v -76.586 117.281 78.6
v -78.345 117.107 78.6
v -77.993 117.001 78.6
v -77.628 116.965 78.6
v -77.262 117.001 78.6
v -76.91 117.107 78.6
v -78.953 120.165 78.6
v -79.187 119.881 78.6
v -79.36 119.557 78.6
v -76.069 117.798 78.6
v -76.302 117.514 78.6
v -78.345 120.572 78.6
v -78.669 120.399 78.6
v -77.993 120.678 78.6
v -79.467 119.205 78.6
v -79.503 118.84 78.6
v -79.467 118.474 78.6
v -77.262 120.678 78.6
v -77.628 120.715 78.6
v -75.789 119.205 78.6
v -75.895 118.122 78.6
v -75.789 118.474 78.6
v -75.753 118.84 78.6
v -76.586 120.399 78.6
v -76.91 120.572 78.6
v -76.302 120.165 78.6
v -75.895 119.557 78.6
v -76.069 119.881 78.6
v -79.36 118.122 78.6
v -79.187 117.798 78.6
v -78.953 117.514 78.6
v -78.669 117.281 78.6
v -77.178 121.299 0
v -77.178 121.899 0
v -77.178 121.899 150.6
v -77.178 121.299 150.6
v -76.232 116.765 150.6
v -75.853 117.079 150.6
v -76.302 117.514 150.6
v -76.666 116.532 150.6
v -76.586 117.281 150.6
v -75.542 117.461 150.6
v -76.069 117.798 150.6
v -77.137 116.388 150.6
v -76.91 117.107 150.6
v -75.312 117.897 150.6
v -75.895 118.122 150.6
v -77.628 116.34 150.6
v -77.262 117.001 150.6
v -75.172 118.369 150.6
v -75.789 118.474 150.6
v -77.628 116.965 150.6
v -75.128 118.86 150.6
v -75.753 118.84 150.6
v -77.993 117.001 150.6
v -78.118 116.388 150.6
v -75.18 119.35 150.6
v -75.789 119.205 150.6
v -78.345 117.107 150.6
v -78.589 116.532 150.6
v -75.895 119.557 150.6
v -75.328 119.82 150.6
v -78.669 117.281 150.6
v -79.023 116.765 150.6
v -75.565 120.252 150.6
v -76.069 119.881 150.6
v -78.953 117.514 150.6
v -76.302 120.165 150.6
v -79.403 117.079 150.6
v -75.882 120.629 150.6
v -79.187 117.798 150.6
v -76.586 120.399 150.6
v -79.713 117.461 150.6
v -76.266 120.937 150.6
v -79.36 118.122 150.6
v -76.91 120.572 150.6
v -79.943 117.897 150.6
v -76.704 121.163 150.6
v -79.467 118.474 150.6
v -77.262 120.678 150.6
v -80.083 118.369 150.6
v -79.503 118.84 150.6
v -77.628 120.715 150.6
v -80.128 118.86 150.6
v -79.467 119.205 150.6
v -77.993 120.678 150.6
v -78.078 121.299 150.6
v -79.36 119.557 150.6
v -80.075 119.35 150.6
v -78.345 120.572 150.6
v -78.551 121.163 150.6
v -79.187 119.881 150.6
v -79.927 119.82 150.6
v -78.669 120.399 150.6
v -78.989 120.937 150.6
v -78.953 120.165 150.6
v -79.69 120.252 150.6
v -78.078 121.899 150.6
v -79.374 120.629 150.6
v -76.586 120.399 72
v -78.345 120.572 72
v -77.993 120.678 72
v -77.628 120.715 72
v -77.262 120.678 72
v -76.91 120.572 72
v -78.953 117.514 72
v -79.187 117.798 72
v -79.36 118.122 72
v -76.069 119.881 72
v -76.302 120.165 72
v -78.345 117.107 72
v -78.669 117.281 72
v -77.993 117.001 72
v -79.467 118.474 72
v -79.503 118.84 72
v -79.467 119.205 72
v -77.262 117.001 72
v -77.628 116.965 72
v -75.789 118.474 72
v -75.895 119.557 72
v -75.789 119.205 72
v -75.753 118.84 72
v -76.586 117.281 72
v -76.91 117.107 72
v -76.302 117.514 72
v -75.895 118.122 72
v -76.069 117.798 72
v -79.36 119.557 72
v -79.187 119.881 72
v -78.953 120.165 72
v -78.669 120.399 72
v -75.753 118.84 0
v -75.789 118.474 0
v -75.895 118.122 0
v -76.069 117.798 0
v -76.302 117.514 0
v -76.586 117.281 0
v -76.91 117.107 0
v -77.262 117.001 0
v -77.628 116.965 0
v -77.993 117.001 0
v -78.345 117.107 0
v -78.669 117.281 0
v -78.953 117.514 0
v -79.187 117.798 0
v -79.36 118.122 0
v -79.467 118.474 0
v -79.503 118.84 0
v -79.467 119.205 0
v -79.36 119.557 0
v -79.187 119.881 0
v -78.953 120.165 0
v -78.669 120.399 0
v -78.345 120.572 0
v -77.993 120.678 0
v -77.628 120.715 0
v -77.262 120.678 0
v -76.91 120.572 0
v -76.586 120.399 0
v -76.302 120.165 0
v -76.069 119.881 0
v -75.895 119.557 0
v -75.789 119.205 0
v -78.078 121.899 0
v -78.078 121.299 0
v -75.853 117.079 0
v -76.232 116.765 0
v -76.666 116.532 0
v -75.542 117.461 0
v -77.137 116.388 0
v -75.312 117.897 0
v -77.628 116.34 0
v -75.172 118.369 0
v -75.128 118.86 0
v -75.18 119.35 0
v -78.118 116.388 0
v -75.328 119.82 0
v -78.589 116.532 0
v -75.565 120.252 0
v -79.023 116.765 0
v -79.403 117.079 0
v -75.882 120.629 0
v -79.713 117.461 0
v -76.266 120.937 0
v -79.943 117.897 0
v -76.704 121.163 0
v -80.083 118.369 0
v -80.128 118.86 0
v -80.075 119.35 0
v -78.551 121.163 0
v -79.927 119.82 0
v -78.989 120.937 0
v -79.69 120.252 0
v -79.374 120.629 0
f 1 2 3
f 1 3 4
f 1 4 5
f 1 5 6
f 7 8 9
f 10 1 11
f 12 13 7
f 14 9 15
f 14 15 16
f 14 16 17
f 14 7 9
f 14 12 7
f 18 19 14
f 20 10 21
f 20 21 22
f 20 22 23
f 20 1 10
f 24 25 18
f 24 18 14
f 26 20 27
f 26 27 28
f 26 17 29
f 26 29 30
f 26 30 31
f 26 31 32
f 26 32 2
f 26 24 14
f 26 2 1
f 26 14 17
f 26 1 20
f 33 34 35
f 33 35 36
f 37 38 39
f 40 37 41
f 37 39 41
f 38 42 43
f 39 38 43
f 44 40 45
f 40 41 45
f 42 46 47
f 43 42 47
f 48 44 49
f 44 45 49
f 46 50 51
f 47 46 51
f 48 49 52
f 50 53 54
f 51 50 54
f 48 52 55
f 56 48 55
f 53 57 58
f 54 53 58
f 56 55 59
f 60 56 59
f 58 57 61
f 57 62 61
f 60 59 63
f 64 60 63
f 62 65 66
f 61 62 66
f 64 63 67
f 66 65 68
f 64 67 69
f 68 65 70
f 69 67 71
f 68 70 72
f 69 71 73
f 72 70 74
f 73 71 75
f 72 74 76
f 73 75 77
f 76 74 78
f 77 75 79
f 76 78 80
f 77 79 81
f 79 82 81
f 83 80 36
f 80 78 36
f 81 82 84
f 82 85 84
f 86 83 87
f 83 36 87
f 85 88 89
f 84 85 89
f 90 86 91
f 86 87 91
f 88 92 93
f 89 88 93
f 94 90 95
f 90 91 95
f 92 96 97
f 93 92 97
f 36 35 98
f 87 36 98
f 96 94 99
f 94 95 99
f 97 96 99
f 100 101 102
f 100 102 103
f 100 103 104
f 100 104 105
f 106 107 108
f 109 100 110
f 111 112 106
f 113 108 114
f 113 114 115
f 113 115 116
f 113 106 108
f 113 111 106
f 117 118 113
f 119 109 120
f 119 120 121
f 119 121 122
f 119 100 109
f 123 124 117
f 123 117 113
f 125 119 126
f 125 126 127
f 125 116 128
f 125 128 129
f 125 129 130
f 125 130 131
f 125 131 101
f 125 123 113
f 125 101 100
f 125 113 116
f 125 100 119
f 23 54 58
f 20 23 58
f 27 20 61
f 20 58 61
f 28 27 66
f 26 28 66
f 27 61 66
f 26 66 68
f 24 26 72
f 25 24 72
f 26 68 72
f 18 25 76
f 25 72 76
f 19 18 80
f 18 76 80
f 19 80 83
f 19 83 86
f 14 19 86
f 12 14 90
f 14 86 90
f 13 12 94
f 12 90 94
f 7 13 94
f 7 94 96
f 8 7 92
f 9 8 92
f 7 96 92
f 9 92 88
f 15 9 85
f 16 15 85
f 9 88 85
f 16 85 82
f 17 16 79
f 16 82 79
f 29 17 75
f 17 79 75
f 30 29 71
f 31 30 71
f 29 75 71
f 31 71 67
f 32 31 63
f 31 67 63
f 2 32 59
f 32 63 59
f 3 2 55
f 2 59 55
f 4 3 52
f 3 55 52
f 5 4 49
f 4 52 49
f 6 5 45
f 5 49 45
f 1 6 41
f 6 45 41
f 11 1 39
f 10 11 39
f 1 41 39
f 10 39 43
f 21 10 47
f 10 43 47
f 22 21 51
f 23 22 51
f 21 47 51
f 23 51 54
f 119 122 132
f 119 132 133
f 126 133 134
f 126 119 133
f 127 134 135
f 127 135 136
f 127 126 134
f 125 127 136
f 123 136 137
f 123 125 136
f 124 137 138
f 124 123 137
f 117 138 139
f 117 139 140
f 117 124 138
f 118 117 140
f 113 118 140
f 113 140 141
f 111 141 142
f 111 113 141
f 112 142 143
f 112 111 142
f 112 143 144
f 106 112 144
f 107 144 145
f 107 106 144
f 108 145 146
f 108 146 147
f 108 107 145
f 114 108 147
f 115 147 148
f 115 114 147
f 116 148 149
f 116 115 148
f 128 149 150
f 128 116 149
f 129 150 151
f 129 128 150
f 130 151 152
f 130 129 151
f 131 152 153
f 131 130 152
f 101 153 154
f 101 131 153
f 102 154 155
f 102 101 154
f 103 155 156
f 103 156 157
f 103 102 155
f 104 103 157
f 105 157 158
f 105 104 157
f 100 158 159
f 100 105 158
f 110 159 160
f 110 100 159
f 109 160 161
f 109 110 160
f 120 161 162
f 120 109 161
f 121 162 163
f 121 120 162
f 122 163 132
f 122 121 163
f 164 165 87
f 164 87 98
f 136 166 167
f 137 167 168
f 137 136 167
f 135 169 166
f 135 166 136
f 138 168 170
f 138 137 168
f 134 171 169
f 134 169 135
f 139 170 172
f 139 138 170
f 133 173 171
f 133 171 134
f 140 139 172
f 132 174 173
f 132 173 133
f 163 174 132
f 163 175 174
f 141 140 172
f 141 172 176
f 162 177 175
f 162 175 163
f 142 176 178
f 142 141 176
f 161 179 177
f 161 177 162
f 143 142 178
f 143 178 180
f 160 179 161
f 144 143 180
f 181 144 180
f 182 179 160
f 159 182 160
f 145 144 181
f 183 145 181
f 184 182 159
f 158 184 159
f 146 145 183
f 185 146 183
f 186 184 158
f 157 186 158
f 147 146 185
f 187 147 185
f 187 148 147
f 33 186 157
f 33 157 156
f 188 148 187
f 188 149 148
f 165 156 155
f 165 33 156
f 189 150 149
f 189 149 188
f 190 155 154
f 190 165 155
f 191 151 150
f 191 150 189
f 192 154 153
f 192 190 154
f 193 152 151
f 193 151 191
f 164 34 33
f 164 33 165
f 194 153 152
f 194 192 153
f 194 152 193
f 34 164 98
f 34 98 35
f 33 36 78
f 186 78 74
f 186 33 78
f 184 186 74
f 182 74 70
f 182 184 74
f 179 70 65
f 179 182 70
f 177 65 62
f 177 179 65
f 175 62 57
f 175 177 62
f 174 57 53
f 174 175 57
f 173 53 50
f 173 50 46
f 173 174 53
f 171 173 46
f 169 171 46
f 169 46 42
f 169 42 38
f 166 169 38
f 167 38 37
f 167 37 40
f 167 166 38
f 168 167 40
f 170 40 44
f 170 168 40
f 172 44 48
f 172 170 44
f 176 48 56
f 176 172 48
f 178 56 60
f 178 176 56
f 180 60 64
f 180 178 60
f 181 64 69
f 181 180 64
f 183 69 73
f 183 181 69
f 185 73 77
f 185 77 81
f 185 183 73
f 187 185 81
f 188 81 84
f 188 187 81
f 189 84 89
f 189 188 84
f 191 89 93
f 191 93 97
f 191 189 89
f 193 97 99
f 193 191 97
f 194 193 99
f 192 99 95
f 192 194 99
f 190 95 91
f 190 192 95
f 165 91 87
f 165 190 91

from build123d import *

# Parameters (mm, degrees)
SALIENTE_EXTRUIR1_DEPTH = 150.6
CROQUIS2_R              = 1.875
CORTAR_EXTRUIR1_DEPTH   = 72
CORTAR_EXTRUIR2_START   = -72
CROQUIS3_R              = 1.875
CORTAR_EXTRUIR2_DEPTH   = 72


with BuildPart() as part:
    # Croquis1 → Saliente-Extruir1 (new body)
    with BuildSketch(Plane.XY):
        with BuildLine():
            Line((-78.077598734, 121.298692457), (-78.077598734, 121.898692457))
            Line((-78.077598734, 121.898692457), (-77.177598734, 121.898692457))
            Line((-77.177598734, 121.898692457), (-77.177598734, 121.298692457))
            ThreePointArc((-77.177598734, 121.298692457), (-77.627598734, 116.339525931), (-78.077598734, 121.298692457))
        make_face()
    extrude(amount=SALIENTE_EXTRUIR1_DEPTH)

    # Croquis2 → Cortar-Extruir1 (cut)
    with BuildSketch(Plane.XY.offset(150.6)):
        with Locations((-77.627598734, 118.839525931)):
            Circle(CROQUIS2_R)
    extrude(amount=-CORTAR_EXTRUIR1_DEPTH, mode=Mode.SUBTRACT)

    # Croquis3 → Cortar-Extruir2 (cut)
    with BuildSketch(Plane(origin=(0, 0, 0), x_dir=(-1, 0, 0), z_dir=(0, 0, -1)).offset(CORTAR_EXTRUIR2_START)):
        with Locations(Location((77.627598734, 118.839525931, 0), (0, 0, 180))):
            Circle(CROQUIS3_R)
    extrude(amount=CORTAR_EXTRUIR2_DEPTH, mode=Mode.SUBTRACT)


solid = part.part
